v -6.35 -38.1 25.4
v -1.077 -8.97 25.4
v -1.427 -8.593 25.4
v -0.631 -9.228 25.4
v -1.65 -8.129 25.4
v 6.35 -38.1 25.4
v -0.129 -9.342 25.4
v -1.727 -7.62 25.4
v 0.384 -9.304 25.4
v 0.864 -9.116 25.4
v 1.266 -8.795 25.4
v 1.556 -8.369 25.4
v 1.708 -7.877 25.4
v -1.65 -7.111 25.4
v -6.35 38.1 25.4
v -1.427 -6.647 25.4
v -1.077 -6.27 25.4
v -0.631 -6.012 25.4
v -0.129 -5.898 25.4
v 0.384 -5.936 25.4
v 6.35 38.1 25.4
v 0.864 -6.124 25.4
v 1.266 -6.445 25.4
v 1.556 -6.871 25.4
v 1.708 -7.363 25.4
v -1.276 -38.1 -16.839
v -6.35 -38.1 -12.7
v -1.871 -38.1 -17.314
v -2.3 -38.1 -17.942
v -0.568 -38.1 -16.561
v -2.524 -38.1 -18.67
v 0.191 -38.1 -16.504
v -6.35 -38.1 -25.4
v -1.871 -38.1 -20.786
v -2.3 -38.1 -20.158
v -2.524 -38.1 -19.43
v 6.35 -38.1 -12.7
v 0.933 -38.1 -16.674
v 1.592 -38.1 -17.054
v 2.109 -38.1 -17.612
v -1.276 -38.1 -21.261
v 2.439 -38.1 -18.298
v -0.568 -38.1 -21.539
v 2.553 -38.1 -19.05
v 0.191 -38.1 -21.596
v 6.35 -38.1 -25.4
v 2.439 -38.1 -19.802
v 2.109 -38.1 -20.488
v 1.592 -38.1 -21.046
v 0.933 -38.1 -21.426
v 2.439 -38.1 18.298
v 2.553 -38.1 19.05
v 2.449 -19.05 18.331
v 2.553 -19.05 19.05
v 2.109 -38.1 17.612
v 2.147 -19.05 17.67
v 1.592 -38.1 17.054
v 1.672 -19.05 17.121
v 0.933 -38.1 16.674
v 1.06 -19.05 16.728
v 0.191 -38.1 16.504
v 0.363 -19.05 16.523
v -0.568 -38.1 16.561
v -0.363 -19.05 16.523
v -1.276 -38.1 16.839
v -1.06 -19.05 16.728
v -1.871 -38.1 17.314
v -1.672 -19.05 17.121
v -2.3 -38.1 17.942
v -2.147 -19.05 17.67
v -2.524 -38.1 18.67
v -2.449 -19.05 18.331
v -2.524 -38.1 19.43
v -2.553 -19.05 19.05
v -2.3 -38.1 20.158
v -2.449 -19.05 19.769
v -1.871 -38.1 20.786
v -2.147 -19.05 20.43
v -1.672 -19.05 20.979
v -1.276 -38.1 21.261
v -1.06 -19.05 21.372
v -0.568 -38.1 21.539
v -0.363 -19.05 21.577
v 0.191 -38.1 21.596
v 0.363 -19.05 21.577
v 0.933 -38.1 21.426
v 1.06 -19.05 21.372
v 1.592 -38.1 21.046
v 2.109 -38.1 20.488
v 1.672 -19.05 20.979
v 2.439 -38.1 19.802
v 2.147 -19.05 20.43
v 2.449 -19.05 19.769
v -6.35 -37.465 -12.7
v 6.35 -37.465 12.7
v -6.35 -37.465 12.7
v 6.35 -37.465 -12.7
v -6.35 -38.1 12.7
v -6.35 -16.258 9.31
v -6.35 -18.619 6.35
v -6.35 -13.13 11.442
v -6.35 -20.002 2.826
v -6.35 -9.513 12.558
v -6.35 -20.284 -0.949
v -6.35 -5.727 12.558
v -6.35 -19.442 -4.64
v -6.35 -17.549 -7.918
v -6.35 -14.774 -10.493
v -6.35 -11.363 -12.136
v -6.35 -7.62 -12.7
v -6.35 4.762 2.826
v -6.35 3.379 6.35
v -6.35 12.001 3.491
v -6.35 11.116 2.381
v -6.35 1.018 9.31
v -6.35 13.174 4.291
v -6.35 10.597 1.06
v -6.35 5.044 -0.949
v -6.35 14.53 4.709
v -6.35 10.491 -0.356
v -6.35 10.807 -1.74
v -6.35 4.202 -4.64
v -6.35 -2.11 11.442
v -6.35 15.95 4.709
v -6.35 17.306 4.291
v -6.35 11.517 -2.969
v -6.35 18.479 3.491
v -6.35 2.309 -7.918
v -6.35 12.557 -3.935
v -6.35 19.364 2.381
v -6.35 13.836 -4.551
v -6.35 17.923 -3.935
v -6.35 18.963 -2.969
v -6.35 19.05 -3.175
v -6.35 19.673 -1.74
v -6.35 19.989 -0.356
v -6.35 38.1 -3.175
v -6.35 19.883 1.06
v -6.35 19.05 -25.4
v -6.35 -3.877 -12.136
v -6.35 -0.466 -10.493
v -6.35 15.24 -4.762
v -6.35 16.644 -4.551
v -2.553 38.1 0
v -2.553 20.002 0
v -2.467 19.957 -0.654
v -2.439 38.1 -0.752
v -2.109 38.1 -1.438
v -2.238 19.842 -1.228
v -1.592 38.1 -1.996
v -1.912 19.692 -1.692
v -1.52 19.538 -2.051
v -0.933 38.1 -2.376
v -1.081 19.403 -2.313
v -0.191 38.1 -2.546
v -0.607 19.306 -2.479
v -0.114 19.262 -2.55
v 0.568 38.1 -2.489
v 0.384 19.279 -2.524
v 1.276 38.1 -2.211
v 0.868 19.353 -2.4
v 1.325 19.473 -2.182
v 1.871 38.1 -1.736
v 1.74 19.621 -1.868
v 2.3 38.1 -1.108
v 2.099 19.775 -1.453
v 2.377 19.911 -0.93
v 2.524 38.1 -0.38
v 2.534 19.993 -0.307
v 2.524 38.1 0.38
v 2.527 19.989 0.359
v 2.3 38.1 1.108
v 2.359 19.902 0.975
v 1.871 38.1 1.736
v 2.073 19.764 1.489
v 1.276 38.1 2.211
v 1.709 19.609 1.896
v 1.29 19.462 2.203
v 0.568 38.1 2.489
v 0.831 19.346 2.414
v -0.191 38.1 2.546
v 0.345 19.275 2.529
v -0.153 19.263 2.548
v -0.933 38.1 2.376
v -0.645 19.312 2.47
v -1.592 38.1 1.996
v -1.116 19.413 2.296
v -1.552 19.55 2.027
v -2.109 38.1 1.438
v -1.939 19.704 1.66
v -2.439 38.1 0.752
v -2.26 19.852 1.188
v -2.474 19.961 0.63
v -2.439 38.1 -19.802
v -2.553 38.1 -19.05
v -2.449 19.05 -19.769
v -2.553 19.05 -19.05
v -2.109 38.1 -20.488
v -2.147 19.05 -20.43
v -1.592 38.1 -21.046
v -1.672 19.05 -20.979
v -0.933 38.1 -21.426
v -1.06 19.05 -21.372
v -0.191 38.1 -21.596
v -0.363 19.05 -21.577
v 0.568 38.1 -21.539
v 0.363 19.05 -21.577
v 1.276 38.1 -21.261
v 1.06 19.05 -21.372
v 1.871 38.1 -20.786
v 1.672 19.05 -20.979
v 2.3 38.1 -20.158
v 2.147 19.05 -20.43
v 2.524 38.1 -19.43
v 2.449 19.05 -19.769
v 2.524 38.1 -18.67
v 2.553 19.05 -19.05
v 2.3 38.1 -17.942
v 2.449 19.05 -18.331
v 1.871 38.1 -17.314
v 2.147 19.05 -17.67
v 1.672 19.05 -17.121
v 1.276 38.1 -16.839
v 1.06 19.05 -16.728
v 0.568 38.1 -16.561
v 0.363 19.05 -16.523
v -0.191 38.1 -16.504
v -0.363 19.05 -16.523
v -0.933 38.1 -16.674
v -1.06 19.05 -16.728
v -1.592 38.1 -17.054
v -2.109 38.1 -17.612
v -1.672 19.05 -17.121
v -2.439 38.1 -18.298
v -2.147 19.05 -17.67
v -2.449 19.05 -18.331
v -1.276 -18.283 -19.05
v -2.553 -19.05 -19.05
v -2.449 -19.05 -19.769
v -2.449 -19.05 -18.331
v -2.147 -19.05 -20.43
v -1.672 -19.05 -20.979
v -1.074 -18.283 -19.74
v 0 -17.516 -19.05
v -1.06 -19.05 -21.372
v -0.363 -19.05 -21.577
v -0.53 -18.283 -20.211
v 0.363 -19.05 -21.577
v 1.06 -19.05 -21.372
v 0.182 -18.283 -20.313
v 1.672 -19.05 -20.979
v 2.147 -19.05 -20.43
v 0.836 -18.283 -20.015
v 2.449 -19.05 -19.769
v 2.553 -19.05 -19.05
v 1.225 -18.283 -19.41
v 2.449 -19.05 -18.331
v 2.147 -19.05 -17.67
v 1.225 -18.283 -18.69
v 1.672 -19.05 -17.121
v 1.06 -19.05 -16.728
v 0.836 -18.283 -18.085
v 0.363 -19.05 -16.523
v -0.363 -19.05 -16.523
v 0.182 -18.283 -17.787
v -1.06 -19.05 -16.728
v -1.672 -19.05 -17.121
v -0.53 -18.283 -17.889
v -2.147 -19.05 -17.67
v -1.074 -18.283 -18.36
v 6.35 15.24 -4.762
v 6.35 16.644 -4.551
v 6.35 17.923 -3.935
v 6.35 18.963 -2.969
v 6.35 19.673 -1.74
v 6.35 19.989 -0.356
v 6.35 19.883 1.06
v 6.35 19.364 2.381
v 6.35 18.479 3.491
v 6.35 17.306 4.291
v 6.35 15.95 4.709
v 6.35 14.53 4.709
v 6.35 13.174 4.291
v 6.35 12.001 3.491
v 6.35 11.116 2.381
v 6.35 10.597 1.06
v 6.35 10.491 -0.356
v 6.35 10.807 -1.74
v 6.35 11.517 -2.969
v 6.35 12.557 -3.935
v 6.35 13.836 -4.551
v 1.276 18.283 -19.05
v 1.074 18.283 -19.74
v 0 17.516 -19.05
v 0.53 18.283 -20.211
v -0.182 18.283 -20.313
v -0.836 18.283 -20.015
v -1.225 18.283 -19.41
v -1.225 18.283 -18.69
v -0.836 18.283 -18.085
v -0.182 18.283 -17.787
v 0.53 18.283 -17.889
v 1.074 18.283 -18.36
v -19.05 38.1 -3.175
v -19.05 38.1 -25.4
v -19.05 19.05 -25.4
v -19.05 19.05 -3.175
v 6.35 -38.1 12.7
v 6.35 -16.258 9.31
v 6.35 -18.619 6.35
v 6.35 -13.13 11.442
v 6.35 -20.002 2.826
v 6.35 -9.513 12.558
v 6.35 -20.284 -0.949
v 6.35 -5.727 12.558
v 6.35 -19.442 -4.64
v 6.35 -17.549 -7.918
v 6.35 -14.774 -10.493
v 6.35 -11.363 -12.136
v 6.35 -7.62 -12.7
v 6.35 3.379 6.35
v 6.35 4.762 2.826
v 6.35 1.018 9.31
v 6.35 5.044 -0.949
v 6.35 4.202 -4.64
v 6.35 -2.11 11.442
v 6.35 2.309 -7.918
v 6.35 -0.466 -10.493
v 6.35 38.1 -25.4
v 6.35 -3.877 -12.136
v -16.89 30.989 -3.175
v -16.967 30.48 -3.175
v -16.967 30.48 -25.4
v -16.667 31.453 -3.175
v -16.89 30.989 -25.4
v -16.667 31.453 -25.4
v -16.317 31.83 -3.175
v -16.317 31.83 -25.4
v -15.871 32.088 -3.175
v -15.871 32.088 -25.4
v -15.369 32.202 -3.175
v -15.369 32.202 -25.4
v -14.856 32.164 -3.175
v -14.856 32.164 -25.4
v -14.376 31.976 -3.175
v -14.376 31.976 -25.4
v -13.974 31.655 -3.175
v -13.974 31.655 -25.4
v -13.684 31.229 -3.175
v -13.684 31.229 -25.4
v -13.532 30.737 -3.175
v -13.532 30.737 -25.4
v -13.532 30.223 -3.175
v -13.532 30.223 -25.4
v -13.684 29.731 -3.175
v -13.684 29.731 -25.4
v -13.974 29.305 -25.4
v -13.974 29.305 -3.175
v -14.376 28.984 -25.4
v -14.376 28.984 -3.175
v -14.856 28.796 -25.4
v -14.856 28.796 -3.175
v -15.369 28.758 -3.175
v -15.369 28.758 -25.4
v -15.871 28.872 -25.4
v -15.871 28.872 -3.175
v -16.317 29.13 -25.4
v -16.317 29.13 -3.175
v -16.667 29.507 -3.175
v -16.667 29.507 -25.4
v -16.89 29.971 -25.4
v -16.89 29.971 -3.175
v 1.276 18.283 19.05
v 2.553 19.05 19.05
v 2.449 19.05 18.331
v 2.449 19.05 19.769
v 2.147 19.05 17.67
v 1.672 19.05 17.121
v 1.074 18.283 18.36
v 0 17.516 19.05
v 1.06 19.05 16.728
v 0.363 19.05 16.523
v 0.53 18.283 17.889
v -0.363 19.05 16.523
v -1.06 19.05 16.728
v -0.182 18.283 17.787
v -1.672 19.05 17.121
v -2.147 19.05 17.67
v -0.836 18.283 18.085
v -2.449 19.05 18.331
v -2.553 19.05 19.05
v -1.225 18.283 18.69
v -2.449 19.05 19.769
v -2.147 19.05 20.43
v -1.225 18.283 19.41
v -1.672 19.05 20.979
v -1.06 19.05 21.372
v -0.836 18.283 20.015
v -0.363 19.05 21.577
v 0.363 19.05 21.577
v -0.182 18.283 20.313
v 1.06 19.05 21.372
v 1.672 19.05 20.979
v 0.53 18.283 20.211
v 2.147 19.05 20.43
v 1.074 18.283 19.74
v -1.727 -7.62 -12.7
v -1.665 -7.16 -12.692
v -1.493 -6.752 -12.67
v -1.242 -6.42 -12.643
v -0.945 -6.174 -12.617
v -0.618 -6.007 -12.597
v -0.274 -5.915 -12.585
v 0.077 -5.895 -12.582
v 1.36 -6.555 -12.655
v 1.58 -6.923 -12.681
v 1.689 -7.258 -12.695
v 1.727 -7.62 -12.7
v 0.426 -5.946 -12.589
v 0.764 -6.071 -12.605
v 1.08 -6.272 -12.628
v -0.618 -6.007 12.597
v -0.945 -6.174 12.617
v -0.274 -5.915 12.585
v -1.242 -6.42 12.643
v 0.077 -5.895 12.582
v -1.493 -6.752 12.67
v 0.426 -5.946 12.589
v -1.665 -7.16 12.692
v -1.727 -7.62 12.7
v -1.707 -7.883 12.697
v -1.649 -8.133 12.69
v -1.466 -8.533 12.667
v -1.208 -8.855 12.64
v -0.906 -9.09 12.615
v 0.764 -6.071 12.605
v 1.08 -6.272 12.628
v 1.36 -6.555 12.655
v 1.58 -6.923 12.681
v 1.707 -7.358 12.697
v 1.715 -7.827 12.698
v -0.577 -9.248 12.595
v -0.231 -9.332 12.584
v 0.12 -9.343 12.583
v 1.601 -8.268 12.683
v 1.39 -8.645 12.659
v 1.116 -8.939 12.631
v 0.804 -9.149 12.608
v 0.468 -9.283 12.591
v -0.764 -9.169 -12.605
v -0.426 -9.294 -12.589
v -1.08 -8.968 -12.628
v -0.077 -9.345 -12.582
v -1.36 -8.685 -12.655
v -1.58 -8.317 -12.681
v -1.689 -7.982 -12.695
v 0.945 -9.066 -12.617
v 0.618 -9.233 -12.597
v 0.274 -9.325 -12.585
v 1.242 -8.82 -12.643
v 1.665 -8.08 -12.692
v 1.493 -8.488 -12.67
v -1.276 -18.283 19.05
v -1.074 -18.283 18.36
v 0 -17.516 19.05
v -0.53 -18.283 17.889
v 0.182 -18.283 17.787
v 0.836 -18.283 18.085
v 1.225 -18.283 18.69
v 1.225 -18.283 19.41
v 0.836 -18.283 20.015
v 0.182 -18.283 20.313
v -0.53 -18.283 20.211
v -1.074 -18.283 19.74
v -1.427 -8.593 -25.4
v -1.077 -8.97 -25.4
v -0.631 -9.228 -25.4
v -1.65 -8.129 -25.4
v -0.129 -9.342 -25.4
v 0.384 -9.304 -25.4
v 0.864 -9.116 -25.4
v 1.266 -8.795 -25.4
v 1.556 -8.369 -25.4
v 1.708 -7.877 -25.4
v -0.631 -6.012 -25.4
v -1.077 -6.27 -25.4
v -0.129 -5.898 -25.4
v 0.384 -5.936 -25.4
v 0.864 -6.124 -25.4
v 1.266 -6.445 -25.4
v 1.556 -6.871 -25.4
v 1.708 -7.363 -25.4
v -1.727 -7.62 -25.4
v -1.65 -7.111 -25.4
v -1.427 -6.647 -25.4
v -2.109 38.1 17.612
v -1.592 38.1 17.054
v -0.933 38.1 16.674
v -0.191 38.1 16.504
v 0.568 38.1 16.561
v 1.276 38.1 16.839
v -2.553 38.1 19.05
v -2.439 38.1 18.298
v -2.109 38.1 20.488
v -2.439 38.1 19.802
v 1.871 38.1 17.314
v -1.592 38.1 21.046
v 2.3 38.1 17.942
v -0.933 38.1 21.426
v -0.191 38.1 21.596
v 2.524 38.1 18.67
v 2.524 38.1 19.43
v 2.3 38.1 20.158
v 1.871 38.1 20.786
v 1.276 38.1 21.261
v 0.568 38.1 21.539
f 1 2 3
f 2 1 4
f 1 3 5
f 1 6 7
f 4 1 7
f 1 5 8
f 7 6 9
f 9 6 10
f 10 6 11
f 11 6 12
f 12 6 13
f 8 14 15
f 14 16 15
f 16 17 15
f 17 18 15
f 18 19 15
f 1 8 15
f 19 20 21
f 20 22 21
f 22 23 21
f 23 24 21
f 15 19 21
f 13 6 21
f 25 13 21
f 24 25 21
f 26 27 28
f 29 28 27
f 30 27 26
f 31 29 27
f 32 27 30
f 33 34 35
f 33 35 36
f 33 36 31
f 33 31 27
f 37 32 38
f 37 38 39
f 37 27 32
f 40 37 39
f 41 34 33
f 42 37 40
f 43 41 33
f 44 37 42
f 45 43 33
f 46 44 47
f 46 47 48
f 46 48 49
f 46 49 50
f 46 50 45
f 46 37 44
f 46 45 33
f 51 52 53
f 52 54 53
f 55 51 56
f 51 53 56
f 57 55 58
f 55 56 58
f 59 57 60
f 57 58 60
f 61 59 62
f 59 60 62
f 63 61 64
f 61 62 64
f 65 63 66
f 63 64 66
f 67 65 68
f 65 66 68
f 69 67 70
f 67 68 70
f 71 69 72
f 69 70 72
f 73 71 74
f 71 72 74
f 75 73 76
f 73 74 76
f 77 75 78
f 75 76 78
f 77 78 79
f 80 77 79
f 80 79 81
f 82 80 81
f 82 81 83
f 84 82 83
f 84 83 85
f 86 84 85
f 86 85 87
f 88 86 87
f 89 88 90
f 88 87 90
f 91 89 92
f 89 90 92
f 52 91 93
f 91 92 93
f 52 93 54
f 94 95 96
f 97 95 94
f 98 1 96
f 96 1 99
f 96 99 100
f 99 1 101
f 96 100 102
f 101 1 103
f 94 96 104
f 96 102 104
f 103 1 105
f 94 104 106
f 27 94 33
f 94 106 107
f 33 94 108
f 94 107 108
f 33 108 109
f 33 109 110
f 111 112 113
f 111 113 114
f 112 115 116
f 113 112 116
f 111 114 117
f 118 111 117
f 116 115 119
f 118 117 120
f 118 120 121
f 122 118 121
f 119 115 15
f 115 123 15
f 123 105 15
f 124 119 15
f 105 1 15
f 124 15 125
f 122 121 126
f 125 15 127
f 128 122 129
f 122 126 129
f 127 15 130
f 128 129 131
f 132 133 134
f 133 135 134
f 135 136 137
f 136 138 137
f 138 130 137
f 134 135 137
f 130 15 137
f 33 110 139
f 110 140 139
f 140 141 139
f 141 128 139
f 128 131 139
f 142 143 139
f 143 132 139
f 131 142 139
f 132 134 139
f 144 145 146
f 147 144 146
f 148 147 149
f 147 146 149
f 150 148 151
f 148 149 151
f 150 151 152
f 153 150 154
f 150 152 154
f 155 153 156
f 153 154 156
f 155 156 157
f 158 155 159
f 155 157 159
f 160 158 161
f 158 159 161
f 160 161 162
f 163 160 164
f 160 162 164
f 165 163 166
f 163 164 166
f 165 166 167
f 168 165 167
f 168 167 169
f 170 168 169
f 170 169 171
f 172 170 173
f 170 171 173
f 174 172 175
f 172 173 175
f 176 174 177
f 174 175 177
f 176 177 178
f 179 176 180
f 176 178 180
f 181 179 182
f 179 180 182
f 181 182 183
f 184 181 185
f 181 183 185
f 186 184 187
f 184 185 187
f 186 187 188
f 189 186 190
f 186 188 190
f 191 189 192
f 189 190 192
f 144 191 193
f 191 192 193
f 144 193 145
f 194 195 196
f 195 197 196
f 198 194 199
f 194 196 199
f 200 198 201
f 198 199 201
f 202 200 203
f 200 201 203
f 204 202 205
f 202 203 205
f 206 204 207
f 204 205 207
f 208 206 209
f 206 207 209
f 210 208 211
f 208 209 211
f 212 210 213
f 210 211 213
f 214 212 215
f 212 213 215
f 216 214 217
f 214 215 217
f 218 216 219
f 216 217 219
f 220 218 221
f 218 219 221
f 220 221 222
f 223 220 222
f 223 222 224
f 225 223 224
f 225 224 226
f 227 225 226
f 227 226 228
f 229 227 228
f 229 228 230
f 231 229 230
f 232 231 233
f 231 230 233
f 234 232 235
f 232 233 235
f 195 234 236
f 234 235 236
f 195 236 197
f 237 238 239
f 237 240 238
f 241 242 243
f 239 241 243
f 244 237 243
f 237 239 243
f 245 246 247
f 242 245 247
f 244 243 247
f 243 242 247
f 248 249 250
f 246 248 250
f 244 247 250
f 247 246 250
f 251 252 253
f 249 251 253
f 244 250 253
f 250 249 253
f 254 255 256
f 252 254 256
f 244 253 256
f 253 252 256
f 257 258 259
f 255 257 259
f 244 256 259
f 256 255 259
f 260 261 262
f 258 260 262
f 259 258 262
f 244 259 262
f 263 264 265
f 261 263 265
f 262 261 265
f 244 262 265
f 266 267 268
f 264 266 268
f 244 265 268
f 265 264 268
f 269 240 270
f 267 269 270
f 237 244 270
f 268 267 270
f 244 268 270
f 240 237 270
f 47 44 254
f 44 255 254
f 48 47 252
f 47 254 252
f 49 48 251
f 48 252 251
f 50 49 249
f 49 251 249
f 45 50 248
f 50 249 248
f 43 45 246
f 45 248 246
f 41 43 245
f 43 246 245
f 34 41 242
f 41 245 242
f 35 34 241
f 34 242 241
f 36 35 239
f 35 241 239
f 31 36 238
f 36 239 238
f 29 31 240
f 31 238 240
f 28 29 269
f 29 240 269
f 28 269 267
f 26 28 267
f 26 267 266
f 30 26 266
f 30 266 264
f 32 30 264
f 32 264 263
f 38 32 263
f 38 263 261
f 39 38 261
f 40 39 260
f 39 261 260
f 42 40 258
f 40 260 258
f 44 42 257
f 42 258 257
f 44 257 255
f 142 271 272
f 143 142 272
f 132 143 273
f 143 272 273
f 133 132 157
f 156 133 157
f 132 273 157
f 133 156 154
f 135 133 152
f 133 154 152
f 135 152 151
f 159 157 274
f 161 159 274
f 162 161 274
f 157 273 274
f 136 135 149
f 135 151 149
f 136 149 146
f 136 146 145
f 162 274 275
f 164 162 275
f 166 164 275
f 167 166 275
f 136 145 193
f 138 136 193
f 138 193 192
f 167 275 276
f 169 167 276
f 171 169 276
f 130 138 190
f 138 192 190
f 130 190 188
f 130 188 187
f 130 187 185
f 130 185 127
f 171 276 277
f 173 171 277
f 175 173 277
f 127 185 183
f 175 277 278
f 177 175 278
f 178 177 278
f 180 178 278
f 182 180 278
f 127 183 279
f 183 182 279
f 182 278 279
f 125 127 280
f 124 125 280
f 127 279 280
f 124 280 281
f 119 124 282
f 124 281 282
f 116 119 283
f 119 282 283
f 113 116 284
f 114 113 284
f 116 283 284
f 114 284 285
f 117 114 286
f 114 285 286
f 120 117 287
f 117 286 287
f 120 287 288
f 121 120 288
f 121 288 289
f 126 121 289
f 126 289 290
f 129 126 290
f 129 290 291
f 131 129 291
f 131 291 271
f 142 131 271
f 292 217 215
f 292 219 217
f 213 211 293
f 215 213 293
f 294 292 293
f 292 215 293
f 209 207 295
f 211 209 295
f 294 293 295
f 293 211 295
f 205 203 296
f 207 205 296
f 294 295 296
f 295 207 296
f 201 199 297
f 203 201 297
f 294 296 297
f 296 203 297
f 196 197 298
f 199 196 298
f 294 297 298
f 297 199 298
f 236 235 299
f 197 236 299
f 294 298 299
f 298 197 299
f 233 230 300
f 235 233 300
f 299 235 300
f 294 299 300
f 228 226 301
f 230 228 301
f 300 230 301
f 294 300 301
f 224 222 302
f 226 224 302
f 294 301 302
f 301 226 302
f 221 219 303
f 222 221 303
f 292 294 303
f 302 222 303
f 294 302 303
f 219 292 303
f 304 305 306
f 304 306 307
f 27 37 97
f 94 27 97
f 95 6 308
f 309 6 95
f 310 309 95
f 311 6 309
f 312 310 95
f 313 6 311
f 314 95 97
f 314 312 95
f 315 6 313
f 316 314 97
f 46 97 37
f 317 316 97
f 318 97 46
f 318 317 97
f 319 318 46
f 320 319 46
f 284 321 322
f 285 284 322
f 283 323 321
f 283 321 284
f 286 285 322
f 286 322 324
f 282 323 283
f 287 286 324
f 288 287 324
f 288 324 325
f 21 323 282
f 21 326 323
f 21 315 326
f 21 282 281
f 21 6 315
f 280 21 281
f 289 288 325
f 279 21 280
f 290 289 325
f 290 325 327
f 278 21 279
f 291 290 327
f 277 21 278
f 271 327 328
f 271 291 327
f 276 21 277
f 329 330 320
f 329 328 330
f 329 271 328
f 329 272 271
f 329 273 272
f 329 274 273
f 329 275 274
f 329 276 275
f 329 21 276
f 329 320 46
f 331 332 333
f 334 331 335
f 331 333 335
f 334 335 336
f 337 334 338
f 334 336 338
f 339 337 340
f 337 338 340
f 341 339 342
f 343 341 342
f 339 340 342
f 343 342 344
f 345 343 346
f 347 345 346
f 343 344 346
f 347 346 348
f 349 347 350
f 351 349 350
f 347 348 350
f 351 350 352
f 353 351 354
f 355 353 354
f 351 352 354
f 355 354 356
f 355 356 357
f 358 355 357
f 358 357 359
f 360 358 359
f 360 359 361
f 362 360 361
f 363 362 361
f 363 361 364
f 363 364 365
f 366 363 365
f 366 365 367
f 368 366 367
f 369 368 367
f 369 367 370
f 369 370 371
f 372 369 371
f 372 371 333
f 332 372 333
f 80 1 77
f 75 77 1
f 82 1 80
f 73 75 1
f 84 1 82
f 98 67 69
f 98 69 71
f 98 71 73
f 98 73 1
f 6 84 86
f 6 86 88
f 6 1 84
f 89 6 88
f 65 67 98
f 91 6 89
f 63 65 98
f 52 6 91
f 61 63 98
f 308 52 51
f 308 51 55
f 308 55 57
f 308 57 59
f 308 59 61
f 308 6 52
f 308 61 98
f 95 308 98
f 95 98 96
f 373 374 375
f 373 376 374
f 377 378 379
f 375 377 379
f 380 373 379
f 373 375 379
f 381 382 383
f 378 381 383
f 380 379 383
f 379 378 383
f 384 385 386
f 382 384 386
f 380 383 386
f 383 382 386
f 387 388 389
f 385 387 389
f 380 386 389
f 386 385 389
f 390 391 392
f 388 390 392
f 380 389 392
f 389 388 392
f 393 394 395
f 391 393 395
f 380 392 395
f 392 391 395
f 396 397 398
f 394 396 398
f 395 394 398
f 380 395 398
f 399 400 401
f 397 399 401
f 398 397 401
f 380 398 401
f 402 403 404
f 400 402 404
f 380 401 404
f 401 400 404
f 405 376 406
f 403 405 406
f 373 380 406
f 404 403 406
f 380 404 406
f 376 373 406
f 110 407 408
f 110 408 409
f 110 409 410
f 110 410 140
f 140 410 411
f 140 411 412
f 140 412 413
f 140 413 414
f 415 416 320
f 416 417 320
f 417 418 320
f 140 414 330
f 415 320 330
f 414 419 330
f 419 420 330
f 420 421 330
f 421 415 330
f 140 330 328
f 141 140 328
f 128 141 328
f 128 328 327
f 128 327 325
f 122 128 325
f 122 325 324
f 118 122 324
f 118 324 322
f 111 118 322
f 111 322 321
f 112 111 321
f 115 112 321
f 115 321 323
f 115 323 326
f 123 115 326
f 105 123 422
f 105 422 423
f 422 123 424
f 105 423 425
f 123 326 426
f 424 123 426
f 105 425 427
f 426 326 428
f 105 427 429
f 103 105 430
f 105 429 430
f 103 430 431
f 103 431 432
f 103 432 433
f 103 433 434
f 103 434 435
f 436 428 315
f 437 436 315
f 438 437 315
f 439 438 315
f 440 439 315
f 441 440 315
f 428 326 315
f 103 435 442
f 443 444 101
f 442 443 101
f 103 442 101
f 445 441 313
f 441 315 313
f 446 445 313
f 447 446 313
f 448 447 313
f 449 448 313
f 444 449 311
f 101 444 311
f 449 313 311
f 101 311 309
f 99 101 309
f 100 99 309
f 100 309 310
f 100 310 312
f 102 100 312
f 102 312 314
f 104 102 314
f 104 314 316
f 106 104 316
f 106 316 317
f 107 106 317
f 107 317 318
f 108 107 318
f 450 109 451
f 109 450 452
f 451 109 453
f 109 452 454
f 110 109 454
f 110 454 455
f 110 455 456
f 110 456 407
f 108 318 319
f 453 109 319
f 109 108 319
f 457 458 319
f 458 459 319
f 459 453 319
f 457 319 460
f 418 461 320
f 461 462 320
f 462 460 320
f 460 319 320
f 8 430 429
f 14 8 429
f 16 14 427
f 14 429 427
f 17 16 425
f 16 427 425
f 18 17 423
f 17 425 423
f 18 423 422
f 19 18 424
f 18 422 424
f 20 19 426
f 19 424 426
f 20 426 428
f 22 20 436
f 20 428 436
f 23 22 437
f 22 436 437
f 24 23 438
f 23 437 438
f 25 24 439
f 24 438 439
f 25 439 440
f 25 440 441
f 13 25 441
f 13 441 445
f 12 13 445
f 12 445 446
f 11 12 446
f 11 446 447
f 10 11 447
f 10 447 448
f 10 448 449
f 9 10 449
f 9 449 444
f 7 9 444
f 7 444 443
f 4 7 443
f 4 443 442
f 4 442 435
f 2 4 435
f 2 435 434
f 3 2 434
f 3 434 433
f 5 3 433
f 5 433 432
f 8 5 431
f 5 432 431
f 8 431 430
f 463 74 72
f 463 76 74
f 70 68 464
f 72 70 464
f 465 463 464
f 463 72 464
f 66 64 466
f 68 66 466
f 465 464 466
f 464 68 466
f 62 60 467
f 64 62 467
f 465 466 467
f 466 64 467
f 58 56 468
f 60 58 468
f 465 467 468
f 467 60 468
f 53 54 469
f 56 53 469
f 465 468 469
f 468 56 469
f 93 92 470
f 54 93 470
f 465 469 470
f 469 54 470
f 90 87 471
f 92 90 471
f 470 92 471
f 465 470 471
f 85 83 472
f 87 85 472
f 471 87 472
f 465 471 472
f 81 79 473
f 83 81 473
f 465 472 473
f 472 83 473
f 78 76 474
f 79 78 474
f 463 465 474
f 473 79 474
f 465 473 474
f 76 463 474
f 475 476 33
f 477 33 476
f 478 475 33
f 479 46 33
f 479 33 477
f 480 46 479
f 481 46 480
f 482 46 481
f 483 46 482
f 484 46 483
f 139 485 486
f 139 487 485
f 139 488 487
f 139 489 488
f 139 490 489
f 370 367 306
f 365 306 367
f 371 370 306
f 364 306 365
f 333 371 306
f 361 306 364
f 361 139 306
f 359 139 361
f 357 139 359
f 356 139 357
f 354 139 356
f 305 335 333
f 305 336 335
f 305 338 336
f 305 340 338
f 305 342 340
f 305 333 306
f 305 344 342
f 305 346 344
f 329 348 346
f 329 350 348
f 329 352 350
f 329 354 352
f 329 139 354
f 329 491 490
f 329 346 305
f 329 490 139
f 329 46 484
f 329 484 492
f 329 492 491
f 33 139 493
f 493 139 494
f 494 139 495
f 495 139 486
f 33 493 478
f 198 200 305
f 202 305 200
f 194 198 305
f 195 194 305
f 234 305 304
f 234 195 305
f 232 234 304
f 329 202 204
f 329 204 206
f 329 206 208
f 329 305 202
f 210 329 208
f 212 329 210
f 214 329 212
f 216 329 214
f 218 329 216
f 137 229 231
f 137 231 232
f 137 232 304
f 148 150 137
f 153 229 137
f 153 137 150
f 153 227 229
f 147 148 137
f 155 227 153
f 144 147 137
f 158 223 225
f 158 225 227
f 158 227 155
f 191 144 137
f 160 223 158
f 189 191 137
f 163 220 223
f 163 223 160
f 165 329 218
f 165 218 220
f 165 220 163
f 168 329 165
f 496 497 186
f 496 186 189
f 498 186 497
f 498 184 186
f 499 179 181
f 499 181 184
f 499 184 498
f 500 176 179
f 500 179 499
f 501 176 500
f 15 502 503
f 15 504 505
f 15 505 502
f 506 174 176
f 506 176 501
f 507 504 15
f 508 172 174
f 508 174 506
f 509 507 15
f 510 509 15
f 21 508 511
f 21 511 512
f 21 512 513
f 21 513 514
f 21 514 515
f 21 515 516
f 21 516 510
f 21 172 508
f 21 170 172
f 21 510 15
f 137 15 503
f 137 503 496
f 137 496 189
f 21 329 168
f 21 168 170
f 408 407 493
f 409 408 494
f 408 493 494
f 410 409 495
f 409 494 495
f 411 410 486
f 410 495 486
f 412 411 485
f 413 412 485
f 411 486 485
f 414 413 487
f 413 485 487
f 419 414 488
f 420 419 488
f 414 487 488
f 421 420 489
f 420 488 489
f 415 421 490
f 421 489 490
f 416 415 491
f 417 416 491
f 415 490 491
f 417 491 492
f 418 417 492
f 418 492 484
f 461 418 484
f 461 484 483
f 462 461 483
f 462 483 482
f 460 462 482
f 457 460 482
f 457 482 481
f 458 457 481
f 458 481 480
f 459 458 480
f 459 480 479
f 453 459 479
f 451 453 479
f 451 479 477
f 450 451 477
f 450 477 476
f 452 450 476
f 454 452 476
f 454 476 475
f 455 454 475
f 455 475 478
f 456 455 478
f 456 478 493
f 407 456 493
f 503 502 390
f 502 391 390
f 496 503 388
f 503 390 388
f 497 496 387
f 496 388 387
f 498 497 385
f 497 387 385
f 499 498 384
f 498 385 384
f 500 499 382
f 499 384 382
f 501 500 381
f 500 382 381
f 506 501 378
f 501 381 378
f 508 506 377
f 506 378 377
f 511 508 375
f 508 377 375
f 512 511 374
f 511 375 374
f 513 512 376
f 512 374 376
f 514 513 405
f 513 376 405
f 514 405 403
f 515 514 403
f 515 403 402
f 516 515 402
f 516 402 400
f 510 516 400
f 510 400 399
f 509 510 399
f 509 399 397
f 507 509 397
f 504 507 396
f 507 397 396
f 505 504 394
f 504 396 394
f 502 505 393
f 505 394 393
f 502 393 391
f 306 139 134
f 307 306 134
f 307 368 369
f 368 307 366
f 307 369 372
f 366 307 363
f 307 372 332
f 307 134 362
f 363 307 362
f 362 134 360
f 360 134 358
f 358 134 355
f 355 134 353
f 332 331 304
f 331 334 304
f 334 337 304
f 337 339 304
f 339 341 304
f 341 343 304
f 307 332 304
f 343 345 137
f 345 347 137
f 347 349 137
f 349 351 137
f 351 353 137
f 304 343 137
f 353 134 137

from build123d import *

# Parameters (mm, degrees)
SKETCH1_W                   = 50.8
SKETCH1_H                   = 76.2
BOSS_EXTRUDE1_DEPTH         = 6.35
F_1_4_20_TAPPED_HOLE1_D     = 5.1054
F_1_4_20_TAPPED_HOLE1_DEPTH = 19.05
F_1_4_20_TAPPED_HOLE1_TIP   = 1.533816902
CUT_EXTRUDE1_REACH          = 14.7
SKETCH5_W                   = 25.4
SKETCH5_H                   = 0.635
F_1_4_20_TAPPED_HOLE2_D     = 5.1054
F_1_4_20_TAPPED_HOLE2_DEPTH = 19.05
F_1_4_20_TAPPED_HOLE2_TIP   = 1.533816902
CUT_EXTRUDE2_REACH          = 14.7
SKETCH8_R                   = 12.7
SKETCH9_W                   = 22.225
SKETCH9_H                   = 19.05
BOSS_EXTRUDE2_DEPTH         = 12.7
F_8_32_TAPPED_HOLE1_D       = 3.4544
SKETCH12_R                  = 4.7625
CUT_EXTRUDE3_DEPTH          = 26.4
F_8_32_TAPPED_HOLE2_D       = 3.4544


with BuildPart() as part:
    # Sketch1 → Boss-Extrude1 (new body, symmetric)
    with BuildSketch(Plane(origin=(0, 0, 0), x_dir=(0, 0, -1), z_dir=(1, 0, 0))):
        Rectangle(SKETCH1_W, SKETCH1_H)
    extrude(amount=BOSS_EXTRUDE1_DEPTH, both=True)

    # 1/4-20 Tapped Hole1
    with Locations(Plane(origin=(0, -38.1, 0), x_dir=(-1, 0, 0), z_dir=(0, -1, 0))):
        with Locations((0, -19.05), (0, 19.05)):
            Hole(F_1_4_20_TAPPED_HOLE1_D / 2, depth=F_1_4_20_TAPPED_HOLE1_DEPTH)
            with Locations((0, 0, -(F_1_4_20_TAPPED_HOLE1_DEPTH + F_1_4_20_TAPPED_HOLE1_TIP / 2))):  # 118° drill point
                Cone(0, F_1_4_20_TAPPED_HOLE1_D / 2, F_1_4_20_TAPPED_HOLE1_TIP, mode=Mode.SUBTRACT)

    # Sketch5 → Cut-Extrude1 (cut, up to next)
    with BuildSketch(Plane(origin=(6.35, 0, 0), x_dir=(0, 0, -1), z_dir=(1, 0, 0)), mode=Mode.PRIVATE) as cut_extrude1_sk1:
        with Locations((0, -37.7825)):
            Rectangle(SKETCH5_W, SKETCH5_H)
    cut_extrude1_tool1 = extrude(cut_extrude1_sk1.sketch, amount=-CUT_EXTRUDE1_REACH, mode=Mode.PRIVATE) & part.part
    add(cut_extrude1_tool1.solids().sort_by_distance((6.35, -37.7825, 0))[0], mode=Mode.SUBTRACT)

    # 1/4-20 Tapped Hole2
    with Locations(Plane(origin=(0, 38.1, 0), x_dir=(1, 0, 0), z_dir=(0, 1, 0))):
        with Locations((0, 19.05), (0, 0), (0, -19.05)):
            Hole(F_1_4_20_TAPPED_HOLE2_D / 2, depth=F_1_4_20_TAPPED_HOLE2_DEPTH)
            with Locations((0, 0, -(F_1_4_20_TAPPED_HOLE2_DEPTH + F_1_4_20_TAPPED_HOLE2_TIP / 2))):  # 118° drill point
                Cone(0, F_1_4_20_TAPPED_HOLE2_D / 2, F_1_4_20_TAPPED_HOLE2_TIP, mode=Mode.SUBTRACT)

    # Sketch8 → Cut-Extrude2 (cut, up to next)
    with BuildSketch(Plane(origin=(6.35, 0, 0), x_dir=(0, 0, -1), z_dir=(1, 0, 0)), mode=Mode.PRIVATE) as cut_extrude2_sk1:
        with Locations((0, -7.62)):
            Circle(SKETCH8_R)
    cut_extrude2_tool1 = extrude(cut_extrude2_sk1.sketch, amount=-CUT_EXTRUDE2_REACH, mode=Mode.PRIVATE) & part.part
    add(cut_extrude2_tool1.solids().sort_by_distance((6.35, -7.62, 0))[0], mode=Mode.SUBTRACT)

    # Sketch9 → Boss-Extrude2 (add)
    with BuildSketch(Plane.ZY.offset(6.35)):
        with Locations((-14.2875, 28.575)):
            Rectangle(SKETCH9_W, SKETCH9_H)
    extrude(amount=BOSS_EXTRUDE2_DEPTH)

    # #8-32 Tapped Hole1 (through all)
    with Locations(Plane.XY.offset(-3.175)):
        with Locations((-15.24, 30.48)):
            Hole(F_8_32_TAPPED_HOLE1_D / 2)

    # Sketch12 → Cut-Extrude3 (cut, through all)
    with BuildSketch(Plane(origin=(6.35, 0, 0), x_dir=(0, 0, -1), z_dir=(1, 0, 0))):
        with Locations((0, 15.24)):
            Circle(SKETCH12_R)
    extrude(amount=-CUT_EXTRUDE3_DEPTH, mode=Mode.SUBTRACT)

    # #8-32 Tapped Hole2 (through all)
    with Locations(Plane.XY.offset(25.4)):
        with Locations((0, -7.62)):
            Hole(F_8_32_TAPPED_HOLE2_D / 2)


solid = part.part
